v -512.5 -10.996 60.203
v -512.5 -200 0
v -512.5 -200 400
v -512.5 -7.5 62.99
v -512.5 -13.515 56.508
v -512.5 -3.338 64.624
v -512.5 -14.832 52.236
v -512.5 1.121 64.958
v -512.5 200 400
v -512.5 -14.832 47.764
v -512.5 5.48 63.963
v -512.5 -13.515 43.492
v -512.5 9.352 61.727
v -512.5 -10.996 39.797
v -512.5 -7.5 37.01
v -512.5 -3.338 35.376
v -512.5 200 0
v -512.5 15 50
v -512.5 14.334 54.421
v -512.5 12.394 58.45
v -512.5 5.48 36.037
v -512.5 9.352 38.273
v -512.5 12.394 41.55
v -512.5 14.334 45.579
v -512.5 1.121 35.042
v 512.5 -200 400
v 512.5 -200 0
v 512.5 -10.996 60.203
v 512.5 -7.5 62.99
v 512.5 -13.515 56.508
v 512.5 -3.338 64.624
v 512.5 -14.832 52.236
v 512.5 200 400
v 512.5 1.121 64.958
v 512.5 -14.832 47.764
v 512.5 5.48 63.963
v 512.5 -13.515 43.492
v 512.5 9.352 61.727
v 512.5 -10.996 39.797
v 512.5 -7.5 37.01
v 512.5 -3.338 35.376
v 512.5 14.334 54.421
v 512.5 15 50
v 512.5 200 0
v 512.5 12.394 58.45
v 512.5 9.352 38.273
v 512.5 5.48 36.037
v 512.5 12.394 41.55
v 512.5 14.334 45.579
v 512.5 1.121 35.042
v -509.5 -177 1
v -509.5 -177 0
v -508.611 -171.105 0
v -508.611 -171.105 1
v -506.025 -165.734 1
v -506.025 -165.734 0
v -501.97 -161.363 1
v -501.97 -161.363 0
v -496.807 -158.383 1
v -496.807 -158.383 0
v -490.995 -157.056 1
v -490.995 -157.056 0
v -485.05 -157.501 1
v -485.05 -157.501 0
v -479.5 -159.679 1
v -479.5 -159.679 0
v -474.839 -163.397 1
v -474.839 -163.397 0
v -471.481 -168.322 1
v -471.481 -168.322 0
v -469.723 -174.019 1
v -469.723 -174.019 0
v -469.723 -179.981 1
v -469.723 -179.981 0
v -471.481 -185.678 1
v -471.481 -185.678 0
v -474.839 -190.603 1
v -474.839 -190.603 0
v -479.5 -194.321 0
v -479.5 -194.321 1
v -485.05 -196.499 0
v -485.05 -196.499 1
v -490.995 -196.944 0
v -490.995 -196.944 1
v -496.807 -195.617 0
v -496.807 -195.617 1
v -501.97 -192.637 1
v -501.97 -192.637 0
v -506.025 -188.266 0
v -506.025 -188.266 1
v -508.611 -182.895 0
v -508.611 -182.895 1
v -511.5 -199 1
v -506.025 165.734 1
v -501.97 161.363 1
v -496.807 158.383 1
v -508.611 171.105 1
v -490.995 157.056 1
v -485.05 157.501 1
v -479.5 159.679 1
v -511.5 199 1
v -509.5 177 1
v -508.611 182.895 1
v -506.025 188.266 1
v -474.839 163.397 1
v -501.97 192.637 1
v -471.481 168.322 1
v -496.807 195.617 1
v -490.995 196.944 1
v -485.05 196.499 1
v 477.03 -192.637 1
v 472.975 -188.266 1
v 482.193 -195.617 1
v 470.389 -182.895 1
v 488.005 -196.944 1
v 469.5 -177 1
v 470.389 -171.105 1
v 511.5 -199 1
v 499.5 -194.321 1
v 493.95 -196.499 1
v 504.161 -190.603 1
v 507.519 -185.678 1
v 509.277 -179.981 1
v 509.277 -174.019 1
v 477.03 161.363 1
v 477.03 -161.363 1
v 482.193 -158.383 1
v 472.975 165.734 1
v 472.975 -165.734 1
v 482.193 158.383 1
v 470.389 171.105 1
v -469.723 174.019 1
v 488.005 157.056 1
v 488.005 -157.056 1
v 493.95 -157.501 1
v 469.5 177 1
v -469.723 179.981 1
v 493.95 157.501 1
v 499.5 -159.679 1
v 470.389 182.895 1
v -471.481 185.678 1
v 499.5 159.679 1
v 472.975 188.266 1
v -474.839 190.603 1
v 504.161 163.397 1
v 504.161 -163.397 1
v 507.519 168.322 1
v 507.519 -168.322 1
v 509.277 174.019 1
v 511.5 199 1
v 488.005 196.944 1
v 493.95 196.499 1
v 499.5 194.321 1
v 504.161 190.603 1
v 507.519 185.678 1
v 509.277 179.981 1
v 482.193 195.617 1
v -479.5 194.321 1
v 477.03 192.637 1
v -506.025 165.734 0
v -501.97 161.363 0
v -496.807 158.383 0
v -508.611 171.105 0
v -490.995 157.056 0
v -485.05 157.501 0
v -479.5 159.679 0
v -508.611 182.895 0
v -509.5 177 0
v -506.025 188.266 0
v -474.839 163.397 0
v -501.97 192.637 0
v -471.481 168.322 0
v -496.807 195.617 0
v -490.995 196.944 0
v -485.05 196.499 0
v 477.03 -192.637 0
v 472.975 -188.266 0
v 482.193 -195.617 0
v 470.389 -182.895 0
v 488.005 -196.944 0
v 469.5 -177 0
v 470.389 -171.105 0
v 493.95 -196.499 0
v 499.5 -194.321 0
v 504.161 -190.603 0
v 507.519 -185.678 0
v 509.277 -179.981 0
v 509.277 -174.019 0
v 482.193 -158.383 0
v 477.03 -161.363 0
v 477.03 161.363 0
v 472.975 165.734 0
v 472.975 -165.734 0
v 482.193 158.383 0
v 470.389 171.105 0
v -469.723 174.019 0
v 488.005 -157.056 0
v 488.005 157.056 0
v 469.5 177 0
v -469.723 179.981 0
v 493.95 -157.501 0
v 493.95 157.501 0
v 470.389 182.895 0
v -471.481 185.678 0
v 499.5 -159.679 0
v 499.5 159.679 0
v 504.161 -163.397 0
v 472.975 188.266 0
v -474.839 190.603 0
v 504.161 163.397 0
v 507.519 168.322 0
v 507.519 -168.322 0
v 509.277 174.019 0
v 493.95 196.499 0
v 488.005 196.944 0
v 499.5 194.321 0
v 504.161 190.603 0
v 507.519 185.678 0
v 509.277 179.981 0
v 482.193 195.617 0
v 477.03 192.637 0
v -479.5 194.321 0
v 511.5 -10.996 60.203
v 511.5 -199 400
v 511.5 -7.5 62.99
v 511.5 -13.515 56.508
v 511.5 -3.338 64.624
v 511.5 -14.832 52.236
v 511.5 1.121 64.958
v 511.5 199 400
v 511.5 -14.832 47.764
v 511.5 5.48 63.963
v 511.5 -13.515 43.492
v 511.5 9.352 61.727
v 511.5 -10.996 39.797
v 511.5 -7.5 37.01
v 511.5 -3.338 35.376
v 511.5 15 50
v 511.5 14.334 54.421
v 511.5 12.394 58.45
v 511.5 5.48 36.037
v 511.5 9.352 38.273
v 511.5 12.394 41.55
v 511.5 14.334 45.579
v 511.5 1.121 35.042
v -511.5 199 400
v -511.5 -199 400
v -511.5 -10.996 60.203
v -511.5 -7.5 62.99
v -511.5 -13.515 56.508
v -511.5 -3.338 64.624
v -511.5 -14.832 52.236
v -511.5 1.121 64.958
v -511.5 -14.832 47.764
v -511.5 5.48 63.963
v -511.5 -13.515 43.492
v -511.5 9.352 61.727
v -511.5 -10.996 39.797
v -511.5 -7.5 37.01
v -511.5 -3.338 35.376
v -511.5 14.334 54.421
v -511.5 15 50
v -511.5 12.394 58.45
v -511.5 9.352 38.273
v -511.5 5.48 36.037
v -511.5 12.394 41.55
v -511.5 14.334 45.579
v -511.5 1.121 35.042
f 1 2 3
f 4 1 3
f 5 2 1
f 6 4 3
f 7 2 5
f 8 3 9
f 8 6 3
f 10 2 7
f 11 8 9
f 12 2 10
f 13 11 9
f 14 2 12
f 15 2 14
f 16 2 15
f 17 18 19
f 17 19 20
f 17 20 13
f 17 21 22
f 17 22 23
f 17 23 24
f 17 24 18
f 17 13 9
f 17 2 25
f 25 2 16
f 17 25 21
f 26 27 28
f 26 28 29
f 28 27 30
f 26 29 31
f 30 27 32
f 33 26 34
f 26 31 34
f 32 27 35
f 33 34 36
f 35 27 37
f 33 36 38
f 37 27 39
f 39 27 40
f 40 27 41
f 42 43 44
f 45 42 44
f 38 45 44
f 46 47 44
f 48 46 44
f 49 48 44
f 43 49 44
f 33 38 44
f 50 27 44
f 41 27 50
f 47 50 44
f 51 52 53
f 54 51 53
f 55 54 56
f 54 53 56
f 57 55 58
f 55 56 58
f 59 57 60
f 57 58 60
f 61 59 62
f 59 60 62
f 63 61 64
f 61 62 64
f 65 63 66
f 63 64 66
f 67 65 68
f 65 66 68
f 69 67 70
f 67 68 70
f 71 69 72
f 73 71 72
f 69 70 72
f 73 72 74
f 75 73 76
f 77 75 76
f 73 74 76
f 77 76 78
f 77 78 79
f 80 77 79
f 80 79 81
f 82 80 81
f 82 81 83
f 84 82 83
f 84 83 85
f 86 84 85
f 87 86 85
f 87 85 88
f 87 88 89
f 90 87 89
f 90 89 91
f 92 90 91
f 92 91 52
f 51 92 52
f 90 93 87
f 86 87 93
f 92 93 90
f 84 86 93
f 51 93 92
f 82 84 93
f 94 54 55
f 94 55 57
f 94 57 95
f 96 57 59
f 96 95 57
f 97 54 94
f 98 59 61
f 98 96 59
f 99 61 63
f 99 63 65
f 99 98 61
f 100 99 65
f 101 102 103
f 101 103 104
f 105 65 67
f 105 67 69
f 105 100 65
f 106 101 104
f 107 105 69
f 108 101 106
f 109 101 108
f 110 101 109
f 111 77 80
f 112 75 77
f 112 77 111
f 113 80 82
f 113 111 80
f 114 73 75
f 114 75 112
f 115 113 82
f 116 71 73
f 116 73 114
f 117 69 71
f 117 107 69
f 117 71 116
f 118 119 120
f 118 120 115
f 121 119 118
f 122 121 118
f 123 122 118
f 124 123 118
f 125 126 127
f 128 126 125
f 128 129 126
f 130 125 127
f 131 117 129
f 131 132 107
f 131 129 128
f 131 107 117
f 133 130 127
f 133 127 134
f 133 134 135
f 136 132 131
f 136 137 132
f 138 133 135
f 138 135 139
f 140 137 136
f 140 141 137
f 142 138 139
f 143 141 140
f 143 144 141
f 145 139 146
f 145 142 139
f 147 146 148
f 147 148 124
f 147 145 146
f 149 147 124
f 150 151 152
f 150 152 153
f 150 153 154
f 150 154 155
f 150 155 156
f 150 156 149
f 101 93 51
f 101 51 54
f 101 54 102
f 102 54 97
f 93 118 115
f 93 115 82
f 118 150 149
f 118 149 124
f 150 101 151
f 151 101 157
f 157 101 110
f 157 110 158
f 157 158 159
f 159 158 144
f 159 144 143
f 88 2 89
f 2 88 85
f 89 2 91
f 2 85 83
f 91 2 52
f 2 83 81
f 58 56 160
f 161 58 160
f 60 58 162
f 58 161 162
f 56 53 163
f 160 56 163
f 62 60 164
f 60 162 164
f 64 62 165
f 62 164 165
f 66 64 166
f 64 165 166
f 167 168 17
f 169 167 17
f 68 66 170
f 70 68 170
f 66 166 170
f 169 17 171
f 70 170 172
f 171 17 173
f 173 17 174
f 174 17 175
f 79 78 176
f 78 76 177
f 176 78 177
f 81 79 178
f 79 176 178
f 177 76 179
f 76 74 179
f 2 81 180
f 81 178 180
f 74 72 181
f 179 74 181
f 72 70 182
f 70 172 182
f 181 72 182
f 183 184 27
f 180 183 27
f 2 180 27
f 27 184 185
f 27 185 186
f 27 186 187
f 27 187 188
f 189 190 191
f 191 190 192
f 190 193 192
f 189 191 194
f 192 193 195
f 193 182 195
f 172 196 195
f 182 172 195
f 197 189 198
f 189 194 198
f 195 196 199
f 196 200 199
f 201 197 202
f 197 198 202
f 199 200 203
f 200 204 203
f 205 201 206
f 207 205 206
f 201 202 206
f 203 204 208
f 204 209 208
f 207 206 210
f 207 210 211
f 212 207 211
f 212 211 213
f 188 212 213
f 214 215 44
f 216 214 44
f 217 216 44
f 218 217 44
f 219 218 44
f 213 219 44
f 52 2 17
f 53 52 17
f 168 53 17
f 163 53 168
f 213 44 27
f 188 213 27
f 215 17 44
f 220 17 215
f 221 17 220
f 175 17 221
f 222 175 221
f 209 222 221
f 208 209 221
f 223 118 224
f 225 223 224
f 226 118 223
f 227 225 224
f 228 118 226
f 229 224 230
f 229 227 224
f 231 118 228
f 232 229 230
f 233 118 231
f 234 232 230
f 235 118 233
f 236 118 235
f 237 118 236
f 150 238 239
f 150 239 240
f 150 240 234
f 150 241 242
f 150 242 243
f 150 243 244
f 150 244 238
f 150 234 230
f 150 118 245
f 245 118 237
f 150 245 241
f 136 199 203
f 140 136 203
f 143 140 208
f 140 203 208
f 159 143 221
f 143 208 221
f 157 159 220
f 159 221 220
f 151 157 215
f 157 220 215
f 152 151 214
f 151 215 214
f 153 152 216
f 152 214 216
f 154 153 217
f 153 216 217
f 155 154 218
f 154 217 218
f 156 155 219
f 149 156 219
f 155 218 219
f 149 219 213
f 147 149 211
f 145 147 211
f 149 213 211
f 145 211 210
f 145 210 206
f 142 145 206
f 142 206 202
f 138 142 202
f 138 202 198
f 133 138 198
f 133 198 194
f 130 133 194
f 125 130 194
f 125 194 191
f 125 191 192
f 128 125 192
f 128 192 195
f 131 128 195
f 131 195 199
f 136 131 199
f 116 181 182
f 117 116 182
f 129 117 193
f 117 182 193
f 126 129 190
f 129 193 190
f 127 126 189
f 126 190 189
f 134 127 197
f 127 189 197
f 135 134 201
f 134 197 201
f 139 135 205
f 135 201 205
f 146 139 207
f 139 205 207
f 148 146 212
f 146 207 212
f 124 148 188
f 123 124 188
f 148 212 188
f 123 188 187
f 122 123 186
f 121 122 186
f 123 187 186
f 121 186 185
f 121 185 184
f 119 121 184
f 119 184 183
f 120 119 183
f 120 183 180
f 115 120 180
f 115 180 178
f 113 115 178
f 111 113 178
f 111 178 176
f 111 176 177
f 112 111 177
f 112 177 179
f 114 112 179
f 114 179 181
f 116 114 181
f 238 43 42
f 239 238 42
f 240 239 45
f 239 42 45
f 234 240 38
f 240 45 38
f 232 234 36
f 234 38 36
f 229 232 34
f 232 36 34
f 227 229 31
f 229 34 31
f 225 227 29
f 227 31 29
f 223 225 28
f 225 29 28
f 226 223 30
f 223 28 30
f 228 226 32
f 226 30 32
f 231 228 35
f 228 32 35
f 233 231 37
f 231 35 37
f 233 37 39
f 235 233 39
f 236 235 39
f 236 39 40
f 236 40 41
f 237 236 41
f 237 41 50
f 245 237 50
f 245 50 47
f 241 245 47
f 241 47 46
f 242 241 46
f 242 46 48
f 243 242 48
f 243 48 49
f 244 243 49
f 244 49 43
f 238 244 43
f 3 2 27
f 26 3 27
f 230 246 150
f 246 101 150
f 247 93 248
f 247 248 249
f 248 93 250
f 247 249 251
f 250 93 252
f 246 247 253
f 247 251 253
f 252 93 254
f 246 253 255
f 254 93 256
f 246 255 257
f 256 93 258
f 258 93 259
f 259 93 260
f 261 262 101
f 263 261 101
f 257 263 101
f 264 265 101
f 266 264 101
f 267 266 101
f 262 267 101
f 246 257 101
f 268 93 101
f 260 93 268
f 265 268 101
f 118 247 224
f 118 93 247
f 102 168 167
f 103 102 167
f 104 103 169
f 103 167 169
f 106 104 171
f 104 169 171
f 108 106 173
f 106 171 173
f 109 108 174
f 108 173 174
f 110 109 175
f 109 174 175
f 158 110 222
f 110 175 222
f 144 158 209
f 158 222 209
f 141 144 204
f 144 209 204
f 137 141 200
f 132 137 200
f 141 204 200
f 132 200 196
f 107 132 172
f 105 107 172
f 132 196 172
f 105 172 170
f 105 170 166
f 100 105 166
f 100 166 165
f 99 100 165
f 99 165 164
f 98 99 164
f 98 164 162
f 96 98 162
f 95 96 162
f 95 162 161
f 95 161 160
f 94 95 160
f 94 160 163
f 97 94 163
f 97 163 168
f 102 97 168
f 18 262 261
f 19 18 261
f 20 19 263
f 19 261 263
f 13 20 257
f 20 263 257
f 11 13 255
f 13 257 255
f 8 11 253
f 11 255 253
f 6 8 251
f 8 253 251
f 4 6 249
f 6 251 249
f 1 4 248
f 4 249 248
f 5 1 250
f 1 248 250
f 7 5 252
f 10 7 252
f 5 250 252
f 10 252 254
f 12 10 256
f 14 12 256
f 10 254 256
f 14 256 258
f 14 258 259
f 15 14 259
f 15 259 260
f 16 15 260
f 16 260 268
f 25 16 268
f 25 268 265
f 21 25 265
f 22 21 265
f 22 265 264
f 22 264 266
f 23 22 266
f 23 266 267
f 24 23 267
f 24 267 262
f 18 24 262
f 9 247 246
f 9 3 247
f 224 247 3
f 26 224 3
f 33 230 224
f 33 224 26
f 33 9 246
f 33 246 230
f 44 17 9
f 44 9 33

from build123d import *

# Parameters (mm, degrees)
F0_W     = 1025
F0_H     = 400
F1_DEPTH = 400
F2_T     = -1
F5_D     = 40
F8_D     = 30


# Not quite as in the source:
# - the program builds the solid bodies; features that only make, move or delete a surface that nothing else refers to are left out


with BuildPart() as f1:
    # F0 (on Top) → F1 (new body)
    with BuildSketch(Plane.XY):
        Rectangle(F0_W, F0_H)
    extrude(amount=F1_DEPTH)

    # F2
    f2_openings = [f1.faces().sort_by_distance(p)[0] for p in [
        (0, 0, 400),
    ]]
    offset(amount=F2_T, openings=f2_openings)

    # F5 (through all)
    with Locations(Plane.XY.offset(1)):
        with Locations((489.5, 177), (489.5, -177), (-489.5, 177), (-489.5, -177)):
            Hole(F5_D / 2)

    # F8 (through all)
    with Locations(Plane(origin=(-512.5, 0, 0), x_dir=(0, -1, 0), z_dir=(-1, 0, 0))):
        with Locations((0, 50)):
            Hole(F8_D / 2)


solid = f1.part
